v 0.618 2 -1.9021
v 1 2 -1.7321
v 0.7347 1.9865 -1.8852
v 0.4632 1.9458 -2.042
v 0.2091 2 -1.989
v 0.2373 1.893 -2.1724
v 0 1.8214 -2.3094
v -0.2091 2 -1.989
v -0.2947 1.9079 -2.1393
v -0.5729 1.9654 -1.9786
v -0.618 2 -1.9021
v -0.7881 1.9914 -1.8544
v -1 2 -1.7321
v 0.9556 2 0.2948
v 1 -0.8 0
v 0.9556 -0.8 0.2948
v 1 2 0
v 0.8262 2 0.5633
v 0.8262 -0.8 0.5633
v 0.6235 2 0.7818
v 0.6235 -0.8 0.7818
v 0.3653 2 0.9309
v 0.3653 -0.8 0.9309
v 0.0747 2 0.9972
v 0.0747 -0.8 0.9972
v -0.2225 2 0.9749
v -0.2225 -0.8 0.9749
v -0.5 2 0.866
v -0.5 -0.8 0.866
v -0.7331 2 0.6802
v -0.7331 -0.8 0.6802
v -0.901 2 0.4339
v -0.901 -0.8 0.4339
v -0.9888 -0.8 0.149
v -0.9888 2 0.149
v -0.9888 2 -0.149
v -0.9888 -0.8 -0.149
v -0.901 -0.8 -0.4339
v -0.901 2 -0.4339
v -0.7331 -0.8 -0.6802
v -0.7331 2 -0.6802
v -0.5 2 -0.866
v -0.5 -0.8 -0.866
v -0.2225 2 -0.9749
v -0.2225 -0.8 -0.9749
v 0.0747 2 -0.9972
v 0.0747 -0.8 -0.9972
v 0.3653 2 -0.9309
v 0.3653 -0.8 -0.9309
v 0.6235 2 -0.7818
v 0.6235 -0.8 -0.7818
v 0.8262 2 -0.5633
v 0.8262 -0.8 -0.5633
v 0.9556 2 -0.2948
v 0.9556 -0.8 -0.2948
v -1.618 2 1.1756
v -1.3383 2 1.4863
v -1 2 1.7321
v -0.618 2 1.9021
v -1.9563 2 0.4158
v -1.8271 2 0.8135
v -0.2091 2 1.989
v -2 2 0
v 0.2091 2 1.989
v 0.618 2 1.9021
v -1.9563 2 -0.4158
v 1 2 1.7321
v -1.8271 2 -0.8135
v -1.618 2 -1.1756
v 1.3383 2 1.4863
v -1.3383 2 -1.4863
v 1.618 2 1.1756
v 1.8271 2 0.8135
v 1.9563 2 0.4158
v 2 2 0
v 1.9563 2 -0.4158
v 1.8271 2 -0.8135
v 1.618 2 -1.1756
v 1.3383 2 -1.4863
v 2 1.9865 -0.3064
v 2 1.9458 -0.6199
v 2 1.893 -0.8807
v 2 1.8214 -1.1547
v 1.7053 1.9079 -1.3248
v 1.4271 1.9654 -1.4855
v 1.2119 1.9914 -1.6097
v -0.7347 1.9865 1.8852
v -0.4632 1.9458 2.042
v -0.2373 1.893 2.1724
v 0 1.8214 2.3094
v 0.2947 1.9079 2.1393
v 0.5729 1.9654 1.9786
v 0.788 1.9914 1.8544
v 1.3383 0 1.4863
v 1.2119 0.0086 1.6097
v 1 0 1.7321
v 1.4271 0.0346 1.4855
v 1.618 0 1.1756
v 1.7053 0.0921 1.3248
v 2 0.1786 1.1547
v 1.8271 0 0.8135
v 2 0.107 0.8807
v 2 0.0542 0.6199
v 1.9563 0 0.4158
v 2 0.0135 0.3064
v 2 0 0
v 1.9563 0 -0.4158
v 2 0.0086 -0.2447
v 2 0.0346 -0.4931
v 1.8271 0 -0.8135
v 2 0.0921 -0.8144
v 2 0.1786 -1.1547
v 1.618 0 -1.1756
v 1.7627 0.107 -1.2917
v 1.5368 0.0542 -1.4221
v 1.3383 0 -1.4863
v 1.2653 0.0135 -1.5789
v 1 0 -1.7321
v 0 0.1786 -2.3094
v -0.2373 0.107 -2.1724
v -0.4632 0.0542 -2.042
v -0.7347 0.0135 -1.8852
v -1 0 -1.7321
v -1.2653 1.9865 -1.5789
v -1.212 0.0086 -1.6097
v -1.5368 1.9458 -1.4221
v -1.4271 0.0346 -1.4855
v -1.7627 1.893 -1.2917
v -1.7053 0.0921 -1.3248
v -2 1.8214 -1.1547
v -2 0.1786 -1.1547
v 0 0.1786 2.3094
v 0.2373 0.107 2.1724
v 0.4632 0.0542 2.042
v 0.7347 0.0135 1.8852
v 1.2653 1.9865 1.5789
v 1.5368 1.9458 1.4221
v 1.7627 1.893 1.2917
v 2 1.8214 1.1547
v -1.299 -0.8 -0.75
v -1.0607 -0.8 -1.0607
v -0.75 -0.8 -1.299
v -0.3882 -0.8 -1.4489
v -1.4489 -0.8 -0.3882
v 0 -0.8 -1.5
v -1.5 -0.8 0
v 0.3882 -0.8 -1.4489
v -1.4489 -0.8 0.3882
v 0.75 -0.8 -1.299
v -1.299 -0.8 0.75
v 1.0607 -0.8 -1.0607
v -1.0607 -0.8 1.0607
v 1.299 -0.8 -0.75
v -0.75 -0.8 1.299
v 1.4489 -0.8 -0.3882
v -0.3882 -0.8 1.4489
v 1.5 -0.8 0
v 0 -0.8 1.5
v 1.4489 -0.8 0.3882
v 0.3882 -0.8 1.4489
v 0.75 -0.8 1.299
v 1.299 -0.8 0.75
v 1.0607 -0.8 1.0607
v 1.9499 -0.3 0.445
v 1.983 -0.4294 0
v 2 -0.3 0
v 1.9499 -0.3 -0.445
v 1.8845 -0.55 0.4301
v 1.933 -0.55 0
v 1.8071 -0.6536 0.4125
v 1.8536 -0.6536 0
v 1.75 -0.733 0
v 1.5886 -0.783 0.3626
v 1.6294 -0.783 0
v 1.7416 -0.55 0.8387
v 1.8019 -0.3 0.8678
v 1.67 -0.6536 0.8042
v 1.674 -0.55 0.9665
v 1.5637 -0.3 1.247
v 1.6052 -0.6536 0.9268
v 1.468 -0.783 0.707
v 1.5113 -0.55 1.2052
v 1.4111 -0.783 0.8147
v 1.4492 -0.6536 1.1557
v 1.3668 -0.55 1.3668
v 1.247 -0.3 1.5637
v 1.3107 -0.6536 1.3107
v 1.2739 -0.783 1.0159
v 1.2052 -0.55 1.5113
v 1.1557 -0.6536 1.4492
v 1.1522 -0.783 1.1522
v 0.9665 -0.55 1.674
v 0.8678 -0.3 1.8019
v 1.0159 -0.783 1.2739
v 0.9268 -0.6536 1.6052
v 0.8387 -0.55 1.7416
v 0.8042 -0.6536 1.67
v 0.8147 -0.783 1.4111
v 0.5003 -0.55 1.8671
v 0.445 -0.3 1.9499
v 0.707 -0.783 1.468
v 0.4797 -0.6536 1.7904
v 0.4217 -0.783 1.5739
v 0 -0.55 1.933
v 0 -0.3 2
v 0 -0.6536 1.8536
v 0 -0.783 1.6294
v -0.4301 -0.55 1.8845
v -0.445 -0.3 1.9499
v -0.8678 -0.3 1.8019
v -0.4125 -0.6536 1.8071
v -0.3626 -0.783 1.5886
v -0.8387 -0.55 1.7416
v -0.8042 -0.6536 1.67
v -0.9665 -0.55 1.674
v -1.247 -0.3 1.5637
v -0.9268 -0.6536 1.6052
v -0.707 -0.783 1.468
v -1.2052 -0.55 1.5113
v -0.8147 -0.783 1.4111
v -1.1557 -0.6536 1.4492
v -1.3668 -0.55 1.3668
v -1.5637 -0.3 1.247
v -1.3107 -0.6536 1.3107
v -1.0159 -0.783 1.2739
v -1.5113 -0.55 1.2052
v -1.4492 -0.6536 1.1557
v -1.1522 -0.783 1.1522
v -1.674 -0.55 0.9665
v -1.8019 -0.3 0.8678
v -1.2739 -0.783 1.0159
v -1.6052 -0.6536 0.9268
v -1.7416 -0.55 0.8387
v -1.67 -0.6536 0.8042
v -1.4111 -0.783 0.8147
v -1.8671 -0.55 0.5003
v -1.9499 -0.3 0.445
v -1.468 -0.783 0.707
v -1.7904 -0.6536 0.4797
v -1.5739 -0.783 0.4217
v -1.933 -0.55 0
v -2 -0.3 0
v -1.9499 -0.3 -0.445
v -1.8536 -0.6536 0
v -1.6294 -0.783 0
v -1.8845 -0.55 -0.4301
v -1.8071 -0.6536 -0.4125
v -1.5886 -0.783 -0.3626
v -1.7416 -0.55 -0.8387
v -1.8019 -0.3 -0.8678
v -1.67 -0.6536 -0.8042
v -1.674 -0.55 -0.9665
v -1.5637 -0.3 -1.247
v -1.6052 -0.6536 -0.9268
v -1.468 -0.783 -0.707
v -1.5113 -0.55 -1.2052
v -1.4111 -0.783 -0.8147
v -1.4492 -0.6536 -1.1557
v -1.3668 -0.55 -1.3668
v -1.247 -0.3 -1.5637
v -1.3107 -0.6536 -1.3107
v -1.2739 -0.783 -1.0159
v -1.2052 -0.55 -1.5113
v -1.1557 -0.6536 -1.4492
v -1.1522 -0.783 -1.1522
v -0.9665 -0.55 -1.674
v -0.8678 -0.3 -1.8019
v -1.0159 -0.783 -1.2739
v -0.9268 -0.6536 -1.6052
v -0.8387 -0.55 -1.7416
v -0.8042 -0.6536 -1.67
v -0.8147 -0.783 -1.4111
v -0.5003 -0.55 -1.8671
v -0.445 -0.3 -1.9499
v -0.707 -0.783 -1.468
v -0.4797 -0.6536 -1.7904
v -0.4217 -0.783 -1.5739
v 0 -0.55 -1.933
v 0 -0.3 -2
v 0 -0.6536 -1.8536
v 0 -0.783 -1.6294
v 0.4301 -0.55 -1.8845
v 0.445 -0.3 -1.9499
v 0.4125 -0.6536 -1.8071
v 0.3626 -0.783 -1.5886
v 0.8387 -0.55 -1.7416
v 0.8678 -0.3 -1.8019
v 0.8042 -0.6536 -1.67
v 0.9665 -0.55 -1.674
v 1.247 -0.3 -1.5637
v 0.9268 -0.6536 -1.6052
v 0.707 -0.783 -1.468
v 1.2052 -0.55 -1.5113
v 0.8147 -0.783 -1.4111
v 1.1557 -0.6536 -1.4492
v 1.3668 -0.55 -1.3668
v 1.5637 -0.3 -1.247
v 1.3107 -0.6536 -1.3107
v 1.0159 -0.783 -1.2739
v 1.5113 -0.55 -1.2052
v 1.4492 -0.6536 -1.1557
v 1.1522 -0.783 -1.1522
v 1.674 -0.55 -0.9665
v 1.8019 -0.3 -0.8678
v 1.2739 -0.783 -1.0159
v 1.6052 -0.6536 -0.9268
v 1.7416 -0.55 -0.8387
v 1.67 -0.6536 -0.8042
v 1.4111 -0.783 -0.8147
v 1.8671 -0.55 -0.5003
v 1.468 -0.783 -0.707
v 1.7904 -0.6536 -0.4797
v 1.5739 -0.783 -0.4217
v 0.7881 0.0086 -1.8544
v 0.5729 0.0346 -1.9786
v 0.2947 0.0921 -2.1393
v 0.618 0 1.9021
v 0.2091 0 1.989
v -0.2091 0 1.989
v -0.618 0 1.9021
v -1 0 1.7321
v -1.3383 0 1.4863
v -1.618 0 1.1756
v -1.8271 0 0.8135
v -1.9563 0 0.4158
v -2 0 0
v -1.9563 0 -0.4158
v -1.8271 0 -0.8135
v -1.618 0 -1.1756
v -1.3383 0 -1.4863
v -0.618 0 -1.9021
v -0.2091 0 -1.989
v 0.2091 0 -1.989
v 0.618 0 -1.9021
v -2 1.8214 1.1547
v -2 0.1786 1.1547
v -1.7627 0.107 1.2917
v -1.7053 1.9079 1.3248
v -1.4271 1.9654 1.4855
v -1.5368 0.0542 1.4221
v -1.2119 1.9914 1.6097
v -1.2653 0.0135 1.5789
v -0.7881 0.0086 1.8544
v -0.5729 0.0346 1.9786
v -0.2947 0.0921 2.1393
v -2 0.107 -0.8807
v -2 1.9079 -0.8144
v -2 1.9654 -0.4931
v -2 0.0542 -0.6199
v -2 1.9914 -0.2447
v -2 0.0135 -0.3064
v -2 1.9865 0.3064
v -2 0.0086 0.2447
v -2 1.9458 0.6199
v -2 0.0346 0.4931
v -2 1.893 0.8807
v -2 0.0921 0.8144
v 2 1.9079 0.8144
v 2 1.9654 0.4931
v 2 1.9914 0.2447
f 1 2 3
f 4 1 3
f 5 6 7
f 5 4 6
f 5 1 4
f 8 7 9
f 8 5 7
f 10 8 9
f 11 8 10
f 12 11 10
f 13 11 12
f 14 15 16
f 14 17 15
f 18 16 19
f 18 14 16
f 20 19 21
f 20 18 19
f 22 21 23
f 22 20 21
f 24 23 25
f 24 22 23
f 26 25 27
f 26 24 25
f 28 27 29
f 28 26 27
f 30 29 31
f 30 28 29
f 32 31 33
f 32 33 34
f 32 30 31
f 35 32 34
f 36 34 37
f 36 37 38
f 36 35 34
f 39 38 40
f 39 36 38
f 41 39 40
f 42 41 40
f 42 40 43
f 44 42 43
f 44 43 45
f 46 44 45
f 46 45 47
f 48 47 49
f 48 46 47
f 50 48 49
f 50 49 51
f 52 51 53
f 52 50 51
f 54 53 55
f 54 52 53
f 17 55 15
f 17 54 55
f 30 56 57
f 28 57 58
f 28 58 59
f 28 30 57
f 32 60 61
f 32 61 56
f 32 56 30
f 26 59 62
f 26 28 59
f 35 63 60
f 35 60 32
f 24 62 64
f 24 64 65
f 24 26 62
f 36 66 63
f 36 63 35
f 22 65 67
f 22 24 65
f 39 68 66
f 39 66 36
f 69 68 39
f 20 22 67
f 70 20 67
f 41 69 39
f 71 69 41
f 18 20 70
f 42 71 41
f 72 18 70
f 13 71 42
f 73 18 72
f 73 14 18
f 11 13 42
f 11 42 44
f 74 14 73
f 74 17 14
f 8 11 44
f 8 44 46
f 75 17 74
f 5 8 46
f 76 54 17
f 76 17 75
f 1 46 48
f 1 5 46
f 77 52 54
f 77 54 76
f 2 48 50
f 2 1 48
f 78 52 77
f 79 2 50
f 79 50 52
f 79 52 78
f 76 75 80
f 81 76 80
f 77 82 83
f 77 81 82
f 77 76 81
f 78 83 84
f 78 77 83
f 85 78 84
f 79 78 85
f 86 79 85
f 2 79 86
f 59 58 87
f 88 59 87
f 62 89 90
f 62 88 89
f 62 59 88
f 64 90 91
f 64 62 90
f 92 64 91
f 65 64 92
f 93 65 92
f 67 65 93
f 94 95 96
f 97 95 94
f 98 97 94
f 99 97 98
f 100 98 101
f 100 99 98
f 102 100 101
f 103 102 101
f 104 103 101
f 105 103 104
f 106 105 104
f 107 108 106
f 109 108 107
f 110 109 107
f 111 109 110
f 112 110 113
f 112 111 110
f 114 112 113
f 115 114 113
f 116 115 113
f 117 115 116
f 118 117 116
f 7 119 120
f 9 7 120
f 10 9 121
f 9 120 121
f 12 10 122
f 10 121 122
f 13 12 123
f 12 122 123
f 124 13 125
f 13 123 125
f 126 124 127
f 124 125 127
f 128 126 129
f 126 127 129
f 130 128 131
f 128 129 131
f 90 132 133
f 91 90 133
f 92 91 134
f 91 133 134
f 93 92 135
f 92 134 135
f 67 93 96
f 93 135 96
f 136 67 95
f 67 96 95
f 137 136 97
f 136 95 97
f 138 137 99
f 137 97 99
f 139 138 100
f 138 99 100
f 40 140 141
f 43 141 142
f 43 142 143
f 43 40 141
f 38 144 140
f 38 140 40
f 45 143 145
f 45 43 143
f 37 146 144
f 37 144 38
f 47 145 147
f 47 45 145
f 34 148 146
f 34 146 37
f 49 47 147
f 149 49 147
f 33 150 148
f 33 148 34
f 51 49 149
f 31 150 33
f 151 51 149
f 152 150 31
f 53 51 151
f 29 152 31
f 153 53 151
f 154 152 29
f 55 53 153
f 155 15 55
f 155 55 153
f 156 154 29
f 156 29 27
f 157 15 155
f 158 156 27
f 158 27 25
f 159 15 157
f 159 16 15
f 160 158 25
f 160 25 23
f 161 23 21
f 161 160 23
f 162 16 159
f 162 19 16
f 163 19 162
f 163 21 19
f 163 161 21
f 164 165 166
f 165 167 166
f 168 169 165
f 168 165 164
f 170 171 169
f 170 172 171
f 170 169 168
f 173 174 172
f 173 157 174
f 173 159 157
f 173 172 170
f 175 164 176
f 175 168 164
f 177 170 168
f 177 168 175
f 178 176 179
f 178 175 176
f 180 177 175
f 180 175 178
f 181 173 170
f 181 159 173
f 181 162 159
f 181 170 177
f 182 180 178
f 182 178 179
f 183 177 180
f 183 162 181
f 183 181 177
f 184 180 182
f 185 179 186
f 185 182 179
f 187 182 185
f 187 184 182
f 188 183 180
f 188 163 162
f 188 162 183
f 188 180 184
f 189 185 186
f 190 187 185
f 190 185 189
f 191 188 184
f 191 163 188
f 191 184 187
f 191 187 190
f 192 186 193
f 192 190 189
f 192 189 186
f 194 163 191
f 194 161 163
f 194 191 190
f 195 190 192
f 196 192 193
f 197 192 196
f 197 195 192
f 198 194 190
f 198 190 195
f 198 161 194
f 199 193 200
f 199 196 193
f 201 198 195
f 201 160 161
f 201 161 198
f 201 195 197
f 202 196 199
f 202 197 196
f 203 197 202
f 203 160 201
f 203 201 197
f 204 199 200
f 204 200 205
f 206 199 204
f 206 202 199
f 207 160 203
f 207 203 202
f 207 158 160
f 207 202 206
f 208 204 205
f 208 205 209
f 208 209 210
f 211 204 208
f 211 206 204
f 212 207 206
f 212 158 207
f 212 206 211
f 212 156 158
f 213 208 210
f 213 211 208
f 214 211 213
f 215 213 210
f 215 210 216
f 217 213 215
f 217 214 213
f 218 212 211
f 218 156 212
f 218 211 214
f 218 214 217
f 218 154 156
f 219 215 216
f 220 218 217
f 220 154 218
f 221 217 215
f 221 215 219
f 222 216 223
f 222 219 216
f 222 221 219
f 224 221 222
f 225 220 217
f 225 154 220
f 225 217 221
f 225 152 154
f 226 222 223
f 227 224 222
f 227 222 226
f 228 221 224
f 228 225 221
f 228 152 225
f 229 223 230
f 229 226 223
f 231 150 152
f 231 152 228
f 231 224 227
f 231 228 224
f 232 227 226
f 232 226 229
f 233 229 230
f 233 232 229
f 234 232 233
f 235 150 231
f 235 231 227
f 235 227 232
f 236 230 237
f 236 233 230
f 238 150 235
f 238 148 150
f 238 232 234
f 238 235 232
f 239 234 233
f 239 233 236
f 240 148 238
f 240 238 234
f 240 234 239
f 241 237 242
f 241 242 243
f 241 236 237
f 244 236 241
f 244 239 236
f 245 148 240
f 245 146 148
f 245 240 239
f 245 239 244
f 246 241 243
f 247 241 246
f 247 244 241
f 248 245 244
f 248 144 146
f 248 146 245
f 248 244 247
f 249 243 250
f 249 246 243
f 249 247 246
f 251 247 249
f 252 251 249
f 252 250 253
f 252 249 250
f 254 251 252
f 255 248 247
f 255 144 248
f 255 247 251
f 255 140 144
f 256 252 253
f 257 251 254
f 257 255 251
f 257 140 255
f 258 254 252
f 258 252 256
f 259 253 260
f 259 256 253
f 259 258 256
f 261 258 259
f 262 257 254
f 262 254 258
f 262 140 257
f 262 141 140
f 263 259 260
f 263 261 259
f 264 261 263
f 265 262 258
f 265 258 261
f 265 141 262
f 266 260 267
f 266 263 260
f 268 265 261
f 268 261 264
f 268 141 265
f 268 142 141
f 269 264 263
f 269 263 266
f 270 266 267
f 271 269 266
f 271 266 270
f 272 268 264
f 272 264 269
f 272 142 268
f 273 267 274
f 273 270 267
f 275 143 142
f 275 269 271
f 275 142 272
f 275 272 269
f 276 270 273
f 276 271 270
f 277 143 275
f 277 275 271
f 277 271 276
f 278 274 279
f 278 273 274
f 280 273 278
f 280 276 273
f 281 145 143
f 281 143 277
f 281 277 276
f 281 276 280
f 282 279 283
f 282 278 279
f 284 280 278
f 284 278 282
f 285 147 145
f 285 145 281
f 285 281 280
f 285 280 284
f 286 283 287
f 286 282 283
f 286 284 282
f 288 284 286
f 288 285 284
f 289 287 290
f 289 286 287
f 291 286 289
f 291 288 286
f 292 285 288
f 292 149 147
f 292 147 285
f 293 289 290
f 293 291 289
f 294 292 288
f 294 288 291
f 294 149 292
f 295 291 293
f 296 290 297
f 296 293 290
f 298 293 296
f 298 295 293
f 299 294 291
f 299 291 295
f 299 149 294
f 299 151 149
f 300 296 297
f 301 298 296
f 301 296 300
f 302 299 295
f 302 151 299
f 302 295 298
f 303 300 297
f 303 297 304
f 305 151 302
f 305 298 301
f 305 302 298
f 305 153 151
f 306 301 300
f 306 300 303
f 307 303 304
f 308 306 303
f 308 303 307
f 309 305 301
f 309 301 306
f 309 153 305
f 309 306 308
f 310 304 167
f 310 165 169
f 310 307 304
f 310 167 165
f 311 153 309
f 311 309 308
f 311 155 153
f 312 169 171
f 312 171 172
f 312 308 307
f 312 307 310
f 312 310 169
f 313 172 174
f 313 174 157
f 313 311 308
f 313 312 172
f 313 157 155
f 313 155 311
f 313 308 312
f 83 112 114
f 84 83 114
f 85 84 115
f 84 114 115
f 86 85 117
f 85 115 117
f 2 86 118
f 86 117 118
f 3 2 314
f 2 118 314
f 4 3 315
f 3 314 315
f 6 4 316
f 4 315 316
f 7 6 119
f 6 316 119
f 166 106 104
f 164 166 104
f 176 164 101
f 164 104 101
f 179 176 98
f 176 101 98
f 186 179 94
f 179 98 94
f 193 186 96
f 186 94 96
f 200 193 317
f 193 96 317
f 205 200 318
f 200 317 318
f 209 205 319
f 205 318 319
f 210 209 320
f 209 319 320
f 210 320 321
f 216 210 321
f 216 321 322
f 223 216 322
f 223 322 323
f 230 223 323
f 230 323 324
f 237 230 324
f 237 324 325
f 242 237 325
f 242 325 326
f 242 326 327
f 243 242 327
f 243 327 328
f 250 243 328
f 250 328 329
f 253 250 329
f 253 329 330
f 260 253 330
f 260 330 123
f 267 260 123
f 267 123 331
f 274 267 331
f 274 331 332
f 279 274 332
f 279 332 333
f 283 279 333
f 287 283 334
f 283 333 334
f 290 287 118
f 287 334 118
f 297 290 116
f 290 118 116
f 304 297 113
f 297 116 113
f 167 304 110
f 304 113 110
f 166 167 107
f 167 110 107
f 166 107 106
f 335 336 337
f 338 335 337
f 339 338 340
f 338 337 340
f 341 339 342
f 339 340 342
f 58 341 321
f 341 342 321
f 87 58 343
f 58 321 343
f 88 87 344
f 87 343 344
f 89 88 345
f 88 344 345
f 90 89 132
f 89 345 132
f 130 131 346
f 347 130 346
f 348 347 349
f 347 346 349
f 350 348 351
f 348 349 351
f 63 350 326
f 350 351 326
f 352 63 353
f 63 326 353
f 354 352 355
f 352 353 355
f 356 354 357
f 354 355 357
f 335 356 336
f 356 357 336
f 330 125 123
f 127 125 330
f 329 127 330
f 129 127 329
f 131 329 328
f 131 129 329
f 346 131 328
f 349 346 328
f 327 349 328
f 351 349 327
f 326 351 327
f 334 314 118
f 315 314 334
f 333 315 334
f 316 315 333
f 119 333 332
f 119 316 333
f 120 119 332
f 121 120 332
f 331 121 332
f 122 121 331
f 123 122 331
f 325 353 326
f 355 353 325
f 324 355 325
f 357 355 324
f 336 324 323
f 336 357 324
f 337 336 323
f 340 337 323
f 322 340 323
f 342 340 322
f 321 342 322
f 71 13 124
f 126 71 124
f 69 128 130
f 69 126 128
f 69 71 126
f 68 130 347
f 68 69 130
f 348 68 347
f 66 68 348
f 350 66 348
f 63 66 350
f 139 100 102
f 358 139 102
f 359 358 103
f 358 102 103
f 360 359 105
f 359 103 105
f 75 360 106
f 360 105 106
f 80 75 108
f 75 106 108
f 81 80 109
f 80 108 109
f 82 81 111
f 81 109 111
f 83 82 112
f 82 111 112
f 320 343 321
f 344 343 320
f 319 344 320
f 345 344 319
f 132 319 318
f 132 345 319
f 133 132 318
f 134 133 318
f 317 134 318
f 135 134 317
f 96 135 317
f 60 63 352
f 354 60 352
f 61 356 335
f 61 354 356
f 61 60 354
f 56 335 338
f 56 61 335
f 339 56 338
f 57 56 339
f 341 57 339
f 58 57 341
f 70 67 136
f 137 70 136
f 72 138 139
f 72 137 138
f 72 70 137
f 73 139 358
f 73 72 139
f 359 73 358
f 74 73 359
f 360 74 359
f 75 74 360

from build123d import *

# Parameters (mm, degrees)
SKETCH_1_R      = 1
EXTRUDE_2_DEPTH = 2
SKETCH_3_R      = 2
SKETCH_3_R_2    = 1
EXTRUDE_3_DEPTH = 0.8
FILLET_1_R      = 0.5


with BuildPart() as part:
    # 草图1 → 凸台-拉伸2 (new body)
    with BuildSketch(Plane(origin=(0, 0, 0), x_dir=(1, 0, 0), z_dir=(0, 1, 0))):
        Polygon((2, 1.154700538), (0, 2.309401077), (-2, 1.154700538), (-2, -1.154700538), (0, -2.309401077), (2, -1.154700538), align=None)
        Circle(SKETCH_1_R, mode=Mode.SUBTRACT)
    extrude(amount=EXTRUDE_2_DEPTH)

    # 草图2 → 切除-旋转1 (revolve, cut)
    with BuildSketch(Plane.XY):
        Polygon((3.732050808, 1), (2, 2), (3.732050808, 2), align=None)
        Polygon((2, 0), (3.732050808, 1), (3.732050808, 0), align=None)
    revolve(axis=Axis((0, 1.981363764, 0), (0, 1, 0)), mode=Mode.SUBTRACT)

    # 草图3 → 凸台-拉伸3 (add)
    with BuildSketch(Plane.XZ):
        Circle(SKETCH_3_R)
        Circle(SKETCH_3_R_2, mode=Mode.SUBTRACT)
    extrude(amount=EXTRUDE_3_DEPTH)

    # 圆角1
    fillet_1_edges = [part.edges().sort_by_distance(p)[0] for p in [
        (-2, -0.8, 0),
    ]]
    fillet(fillet_1_edges, radius=FILLET_1_R)


solid = part.part
